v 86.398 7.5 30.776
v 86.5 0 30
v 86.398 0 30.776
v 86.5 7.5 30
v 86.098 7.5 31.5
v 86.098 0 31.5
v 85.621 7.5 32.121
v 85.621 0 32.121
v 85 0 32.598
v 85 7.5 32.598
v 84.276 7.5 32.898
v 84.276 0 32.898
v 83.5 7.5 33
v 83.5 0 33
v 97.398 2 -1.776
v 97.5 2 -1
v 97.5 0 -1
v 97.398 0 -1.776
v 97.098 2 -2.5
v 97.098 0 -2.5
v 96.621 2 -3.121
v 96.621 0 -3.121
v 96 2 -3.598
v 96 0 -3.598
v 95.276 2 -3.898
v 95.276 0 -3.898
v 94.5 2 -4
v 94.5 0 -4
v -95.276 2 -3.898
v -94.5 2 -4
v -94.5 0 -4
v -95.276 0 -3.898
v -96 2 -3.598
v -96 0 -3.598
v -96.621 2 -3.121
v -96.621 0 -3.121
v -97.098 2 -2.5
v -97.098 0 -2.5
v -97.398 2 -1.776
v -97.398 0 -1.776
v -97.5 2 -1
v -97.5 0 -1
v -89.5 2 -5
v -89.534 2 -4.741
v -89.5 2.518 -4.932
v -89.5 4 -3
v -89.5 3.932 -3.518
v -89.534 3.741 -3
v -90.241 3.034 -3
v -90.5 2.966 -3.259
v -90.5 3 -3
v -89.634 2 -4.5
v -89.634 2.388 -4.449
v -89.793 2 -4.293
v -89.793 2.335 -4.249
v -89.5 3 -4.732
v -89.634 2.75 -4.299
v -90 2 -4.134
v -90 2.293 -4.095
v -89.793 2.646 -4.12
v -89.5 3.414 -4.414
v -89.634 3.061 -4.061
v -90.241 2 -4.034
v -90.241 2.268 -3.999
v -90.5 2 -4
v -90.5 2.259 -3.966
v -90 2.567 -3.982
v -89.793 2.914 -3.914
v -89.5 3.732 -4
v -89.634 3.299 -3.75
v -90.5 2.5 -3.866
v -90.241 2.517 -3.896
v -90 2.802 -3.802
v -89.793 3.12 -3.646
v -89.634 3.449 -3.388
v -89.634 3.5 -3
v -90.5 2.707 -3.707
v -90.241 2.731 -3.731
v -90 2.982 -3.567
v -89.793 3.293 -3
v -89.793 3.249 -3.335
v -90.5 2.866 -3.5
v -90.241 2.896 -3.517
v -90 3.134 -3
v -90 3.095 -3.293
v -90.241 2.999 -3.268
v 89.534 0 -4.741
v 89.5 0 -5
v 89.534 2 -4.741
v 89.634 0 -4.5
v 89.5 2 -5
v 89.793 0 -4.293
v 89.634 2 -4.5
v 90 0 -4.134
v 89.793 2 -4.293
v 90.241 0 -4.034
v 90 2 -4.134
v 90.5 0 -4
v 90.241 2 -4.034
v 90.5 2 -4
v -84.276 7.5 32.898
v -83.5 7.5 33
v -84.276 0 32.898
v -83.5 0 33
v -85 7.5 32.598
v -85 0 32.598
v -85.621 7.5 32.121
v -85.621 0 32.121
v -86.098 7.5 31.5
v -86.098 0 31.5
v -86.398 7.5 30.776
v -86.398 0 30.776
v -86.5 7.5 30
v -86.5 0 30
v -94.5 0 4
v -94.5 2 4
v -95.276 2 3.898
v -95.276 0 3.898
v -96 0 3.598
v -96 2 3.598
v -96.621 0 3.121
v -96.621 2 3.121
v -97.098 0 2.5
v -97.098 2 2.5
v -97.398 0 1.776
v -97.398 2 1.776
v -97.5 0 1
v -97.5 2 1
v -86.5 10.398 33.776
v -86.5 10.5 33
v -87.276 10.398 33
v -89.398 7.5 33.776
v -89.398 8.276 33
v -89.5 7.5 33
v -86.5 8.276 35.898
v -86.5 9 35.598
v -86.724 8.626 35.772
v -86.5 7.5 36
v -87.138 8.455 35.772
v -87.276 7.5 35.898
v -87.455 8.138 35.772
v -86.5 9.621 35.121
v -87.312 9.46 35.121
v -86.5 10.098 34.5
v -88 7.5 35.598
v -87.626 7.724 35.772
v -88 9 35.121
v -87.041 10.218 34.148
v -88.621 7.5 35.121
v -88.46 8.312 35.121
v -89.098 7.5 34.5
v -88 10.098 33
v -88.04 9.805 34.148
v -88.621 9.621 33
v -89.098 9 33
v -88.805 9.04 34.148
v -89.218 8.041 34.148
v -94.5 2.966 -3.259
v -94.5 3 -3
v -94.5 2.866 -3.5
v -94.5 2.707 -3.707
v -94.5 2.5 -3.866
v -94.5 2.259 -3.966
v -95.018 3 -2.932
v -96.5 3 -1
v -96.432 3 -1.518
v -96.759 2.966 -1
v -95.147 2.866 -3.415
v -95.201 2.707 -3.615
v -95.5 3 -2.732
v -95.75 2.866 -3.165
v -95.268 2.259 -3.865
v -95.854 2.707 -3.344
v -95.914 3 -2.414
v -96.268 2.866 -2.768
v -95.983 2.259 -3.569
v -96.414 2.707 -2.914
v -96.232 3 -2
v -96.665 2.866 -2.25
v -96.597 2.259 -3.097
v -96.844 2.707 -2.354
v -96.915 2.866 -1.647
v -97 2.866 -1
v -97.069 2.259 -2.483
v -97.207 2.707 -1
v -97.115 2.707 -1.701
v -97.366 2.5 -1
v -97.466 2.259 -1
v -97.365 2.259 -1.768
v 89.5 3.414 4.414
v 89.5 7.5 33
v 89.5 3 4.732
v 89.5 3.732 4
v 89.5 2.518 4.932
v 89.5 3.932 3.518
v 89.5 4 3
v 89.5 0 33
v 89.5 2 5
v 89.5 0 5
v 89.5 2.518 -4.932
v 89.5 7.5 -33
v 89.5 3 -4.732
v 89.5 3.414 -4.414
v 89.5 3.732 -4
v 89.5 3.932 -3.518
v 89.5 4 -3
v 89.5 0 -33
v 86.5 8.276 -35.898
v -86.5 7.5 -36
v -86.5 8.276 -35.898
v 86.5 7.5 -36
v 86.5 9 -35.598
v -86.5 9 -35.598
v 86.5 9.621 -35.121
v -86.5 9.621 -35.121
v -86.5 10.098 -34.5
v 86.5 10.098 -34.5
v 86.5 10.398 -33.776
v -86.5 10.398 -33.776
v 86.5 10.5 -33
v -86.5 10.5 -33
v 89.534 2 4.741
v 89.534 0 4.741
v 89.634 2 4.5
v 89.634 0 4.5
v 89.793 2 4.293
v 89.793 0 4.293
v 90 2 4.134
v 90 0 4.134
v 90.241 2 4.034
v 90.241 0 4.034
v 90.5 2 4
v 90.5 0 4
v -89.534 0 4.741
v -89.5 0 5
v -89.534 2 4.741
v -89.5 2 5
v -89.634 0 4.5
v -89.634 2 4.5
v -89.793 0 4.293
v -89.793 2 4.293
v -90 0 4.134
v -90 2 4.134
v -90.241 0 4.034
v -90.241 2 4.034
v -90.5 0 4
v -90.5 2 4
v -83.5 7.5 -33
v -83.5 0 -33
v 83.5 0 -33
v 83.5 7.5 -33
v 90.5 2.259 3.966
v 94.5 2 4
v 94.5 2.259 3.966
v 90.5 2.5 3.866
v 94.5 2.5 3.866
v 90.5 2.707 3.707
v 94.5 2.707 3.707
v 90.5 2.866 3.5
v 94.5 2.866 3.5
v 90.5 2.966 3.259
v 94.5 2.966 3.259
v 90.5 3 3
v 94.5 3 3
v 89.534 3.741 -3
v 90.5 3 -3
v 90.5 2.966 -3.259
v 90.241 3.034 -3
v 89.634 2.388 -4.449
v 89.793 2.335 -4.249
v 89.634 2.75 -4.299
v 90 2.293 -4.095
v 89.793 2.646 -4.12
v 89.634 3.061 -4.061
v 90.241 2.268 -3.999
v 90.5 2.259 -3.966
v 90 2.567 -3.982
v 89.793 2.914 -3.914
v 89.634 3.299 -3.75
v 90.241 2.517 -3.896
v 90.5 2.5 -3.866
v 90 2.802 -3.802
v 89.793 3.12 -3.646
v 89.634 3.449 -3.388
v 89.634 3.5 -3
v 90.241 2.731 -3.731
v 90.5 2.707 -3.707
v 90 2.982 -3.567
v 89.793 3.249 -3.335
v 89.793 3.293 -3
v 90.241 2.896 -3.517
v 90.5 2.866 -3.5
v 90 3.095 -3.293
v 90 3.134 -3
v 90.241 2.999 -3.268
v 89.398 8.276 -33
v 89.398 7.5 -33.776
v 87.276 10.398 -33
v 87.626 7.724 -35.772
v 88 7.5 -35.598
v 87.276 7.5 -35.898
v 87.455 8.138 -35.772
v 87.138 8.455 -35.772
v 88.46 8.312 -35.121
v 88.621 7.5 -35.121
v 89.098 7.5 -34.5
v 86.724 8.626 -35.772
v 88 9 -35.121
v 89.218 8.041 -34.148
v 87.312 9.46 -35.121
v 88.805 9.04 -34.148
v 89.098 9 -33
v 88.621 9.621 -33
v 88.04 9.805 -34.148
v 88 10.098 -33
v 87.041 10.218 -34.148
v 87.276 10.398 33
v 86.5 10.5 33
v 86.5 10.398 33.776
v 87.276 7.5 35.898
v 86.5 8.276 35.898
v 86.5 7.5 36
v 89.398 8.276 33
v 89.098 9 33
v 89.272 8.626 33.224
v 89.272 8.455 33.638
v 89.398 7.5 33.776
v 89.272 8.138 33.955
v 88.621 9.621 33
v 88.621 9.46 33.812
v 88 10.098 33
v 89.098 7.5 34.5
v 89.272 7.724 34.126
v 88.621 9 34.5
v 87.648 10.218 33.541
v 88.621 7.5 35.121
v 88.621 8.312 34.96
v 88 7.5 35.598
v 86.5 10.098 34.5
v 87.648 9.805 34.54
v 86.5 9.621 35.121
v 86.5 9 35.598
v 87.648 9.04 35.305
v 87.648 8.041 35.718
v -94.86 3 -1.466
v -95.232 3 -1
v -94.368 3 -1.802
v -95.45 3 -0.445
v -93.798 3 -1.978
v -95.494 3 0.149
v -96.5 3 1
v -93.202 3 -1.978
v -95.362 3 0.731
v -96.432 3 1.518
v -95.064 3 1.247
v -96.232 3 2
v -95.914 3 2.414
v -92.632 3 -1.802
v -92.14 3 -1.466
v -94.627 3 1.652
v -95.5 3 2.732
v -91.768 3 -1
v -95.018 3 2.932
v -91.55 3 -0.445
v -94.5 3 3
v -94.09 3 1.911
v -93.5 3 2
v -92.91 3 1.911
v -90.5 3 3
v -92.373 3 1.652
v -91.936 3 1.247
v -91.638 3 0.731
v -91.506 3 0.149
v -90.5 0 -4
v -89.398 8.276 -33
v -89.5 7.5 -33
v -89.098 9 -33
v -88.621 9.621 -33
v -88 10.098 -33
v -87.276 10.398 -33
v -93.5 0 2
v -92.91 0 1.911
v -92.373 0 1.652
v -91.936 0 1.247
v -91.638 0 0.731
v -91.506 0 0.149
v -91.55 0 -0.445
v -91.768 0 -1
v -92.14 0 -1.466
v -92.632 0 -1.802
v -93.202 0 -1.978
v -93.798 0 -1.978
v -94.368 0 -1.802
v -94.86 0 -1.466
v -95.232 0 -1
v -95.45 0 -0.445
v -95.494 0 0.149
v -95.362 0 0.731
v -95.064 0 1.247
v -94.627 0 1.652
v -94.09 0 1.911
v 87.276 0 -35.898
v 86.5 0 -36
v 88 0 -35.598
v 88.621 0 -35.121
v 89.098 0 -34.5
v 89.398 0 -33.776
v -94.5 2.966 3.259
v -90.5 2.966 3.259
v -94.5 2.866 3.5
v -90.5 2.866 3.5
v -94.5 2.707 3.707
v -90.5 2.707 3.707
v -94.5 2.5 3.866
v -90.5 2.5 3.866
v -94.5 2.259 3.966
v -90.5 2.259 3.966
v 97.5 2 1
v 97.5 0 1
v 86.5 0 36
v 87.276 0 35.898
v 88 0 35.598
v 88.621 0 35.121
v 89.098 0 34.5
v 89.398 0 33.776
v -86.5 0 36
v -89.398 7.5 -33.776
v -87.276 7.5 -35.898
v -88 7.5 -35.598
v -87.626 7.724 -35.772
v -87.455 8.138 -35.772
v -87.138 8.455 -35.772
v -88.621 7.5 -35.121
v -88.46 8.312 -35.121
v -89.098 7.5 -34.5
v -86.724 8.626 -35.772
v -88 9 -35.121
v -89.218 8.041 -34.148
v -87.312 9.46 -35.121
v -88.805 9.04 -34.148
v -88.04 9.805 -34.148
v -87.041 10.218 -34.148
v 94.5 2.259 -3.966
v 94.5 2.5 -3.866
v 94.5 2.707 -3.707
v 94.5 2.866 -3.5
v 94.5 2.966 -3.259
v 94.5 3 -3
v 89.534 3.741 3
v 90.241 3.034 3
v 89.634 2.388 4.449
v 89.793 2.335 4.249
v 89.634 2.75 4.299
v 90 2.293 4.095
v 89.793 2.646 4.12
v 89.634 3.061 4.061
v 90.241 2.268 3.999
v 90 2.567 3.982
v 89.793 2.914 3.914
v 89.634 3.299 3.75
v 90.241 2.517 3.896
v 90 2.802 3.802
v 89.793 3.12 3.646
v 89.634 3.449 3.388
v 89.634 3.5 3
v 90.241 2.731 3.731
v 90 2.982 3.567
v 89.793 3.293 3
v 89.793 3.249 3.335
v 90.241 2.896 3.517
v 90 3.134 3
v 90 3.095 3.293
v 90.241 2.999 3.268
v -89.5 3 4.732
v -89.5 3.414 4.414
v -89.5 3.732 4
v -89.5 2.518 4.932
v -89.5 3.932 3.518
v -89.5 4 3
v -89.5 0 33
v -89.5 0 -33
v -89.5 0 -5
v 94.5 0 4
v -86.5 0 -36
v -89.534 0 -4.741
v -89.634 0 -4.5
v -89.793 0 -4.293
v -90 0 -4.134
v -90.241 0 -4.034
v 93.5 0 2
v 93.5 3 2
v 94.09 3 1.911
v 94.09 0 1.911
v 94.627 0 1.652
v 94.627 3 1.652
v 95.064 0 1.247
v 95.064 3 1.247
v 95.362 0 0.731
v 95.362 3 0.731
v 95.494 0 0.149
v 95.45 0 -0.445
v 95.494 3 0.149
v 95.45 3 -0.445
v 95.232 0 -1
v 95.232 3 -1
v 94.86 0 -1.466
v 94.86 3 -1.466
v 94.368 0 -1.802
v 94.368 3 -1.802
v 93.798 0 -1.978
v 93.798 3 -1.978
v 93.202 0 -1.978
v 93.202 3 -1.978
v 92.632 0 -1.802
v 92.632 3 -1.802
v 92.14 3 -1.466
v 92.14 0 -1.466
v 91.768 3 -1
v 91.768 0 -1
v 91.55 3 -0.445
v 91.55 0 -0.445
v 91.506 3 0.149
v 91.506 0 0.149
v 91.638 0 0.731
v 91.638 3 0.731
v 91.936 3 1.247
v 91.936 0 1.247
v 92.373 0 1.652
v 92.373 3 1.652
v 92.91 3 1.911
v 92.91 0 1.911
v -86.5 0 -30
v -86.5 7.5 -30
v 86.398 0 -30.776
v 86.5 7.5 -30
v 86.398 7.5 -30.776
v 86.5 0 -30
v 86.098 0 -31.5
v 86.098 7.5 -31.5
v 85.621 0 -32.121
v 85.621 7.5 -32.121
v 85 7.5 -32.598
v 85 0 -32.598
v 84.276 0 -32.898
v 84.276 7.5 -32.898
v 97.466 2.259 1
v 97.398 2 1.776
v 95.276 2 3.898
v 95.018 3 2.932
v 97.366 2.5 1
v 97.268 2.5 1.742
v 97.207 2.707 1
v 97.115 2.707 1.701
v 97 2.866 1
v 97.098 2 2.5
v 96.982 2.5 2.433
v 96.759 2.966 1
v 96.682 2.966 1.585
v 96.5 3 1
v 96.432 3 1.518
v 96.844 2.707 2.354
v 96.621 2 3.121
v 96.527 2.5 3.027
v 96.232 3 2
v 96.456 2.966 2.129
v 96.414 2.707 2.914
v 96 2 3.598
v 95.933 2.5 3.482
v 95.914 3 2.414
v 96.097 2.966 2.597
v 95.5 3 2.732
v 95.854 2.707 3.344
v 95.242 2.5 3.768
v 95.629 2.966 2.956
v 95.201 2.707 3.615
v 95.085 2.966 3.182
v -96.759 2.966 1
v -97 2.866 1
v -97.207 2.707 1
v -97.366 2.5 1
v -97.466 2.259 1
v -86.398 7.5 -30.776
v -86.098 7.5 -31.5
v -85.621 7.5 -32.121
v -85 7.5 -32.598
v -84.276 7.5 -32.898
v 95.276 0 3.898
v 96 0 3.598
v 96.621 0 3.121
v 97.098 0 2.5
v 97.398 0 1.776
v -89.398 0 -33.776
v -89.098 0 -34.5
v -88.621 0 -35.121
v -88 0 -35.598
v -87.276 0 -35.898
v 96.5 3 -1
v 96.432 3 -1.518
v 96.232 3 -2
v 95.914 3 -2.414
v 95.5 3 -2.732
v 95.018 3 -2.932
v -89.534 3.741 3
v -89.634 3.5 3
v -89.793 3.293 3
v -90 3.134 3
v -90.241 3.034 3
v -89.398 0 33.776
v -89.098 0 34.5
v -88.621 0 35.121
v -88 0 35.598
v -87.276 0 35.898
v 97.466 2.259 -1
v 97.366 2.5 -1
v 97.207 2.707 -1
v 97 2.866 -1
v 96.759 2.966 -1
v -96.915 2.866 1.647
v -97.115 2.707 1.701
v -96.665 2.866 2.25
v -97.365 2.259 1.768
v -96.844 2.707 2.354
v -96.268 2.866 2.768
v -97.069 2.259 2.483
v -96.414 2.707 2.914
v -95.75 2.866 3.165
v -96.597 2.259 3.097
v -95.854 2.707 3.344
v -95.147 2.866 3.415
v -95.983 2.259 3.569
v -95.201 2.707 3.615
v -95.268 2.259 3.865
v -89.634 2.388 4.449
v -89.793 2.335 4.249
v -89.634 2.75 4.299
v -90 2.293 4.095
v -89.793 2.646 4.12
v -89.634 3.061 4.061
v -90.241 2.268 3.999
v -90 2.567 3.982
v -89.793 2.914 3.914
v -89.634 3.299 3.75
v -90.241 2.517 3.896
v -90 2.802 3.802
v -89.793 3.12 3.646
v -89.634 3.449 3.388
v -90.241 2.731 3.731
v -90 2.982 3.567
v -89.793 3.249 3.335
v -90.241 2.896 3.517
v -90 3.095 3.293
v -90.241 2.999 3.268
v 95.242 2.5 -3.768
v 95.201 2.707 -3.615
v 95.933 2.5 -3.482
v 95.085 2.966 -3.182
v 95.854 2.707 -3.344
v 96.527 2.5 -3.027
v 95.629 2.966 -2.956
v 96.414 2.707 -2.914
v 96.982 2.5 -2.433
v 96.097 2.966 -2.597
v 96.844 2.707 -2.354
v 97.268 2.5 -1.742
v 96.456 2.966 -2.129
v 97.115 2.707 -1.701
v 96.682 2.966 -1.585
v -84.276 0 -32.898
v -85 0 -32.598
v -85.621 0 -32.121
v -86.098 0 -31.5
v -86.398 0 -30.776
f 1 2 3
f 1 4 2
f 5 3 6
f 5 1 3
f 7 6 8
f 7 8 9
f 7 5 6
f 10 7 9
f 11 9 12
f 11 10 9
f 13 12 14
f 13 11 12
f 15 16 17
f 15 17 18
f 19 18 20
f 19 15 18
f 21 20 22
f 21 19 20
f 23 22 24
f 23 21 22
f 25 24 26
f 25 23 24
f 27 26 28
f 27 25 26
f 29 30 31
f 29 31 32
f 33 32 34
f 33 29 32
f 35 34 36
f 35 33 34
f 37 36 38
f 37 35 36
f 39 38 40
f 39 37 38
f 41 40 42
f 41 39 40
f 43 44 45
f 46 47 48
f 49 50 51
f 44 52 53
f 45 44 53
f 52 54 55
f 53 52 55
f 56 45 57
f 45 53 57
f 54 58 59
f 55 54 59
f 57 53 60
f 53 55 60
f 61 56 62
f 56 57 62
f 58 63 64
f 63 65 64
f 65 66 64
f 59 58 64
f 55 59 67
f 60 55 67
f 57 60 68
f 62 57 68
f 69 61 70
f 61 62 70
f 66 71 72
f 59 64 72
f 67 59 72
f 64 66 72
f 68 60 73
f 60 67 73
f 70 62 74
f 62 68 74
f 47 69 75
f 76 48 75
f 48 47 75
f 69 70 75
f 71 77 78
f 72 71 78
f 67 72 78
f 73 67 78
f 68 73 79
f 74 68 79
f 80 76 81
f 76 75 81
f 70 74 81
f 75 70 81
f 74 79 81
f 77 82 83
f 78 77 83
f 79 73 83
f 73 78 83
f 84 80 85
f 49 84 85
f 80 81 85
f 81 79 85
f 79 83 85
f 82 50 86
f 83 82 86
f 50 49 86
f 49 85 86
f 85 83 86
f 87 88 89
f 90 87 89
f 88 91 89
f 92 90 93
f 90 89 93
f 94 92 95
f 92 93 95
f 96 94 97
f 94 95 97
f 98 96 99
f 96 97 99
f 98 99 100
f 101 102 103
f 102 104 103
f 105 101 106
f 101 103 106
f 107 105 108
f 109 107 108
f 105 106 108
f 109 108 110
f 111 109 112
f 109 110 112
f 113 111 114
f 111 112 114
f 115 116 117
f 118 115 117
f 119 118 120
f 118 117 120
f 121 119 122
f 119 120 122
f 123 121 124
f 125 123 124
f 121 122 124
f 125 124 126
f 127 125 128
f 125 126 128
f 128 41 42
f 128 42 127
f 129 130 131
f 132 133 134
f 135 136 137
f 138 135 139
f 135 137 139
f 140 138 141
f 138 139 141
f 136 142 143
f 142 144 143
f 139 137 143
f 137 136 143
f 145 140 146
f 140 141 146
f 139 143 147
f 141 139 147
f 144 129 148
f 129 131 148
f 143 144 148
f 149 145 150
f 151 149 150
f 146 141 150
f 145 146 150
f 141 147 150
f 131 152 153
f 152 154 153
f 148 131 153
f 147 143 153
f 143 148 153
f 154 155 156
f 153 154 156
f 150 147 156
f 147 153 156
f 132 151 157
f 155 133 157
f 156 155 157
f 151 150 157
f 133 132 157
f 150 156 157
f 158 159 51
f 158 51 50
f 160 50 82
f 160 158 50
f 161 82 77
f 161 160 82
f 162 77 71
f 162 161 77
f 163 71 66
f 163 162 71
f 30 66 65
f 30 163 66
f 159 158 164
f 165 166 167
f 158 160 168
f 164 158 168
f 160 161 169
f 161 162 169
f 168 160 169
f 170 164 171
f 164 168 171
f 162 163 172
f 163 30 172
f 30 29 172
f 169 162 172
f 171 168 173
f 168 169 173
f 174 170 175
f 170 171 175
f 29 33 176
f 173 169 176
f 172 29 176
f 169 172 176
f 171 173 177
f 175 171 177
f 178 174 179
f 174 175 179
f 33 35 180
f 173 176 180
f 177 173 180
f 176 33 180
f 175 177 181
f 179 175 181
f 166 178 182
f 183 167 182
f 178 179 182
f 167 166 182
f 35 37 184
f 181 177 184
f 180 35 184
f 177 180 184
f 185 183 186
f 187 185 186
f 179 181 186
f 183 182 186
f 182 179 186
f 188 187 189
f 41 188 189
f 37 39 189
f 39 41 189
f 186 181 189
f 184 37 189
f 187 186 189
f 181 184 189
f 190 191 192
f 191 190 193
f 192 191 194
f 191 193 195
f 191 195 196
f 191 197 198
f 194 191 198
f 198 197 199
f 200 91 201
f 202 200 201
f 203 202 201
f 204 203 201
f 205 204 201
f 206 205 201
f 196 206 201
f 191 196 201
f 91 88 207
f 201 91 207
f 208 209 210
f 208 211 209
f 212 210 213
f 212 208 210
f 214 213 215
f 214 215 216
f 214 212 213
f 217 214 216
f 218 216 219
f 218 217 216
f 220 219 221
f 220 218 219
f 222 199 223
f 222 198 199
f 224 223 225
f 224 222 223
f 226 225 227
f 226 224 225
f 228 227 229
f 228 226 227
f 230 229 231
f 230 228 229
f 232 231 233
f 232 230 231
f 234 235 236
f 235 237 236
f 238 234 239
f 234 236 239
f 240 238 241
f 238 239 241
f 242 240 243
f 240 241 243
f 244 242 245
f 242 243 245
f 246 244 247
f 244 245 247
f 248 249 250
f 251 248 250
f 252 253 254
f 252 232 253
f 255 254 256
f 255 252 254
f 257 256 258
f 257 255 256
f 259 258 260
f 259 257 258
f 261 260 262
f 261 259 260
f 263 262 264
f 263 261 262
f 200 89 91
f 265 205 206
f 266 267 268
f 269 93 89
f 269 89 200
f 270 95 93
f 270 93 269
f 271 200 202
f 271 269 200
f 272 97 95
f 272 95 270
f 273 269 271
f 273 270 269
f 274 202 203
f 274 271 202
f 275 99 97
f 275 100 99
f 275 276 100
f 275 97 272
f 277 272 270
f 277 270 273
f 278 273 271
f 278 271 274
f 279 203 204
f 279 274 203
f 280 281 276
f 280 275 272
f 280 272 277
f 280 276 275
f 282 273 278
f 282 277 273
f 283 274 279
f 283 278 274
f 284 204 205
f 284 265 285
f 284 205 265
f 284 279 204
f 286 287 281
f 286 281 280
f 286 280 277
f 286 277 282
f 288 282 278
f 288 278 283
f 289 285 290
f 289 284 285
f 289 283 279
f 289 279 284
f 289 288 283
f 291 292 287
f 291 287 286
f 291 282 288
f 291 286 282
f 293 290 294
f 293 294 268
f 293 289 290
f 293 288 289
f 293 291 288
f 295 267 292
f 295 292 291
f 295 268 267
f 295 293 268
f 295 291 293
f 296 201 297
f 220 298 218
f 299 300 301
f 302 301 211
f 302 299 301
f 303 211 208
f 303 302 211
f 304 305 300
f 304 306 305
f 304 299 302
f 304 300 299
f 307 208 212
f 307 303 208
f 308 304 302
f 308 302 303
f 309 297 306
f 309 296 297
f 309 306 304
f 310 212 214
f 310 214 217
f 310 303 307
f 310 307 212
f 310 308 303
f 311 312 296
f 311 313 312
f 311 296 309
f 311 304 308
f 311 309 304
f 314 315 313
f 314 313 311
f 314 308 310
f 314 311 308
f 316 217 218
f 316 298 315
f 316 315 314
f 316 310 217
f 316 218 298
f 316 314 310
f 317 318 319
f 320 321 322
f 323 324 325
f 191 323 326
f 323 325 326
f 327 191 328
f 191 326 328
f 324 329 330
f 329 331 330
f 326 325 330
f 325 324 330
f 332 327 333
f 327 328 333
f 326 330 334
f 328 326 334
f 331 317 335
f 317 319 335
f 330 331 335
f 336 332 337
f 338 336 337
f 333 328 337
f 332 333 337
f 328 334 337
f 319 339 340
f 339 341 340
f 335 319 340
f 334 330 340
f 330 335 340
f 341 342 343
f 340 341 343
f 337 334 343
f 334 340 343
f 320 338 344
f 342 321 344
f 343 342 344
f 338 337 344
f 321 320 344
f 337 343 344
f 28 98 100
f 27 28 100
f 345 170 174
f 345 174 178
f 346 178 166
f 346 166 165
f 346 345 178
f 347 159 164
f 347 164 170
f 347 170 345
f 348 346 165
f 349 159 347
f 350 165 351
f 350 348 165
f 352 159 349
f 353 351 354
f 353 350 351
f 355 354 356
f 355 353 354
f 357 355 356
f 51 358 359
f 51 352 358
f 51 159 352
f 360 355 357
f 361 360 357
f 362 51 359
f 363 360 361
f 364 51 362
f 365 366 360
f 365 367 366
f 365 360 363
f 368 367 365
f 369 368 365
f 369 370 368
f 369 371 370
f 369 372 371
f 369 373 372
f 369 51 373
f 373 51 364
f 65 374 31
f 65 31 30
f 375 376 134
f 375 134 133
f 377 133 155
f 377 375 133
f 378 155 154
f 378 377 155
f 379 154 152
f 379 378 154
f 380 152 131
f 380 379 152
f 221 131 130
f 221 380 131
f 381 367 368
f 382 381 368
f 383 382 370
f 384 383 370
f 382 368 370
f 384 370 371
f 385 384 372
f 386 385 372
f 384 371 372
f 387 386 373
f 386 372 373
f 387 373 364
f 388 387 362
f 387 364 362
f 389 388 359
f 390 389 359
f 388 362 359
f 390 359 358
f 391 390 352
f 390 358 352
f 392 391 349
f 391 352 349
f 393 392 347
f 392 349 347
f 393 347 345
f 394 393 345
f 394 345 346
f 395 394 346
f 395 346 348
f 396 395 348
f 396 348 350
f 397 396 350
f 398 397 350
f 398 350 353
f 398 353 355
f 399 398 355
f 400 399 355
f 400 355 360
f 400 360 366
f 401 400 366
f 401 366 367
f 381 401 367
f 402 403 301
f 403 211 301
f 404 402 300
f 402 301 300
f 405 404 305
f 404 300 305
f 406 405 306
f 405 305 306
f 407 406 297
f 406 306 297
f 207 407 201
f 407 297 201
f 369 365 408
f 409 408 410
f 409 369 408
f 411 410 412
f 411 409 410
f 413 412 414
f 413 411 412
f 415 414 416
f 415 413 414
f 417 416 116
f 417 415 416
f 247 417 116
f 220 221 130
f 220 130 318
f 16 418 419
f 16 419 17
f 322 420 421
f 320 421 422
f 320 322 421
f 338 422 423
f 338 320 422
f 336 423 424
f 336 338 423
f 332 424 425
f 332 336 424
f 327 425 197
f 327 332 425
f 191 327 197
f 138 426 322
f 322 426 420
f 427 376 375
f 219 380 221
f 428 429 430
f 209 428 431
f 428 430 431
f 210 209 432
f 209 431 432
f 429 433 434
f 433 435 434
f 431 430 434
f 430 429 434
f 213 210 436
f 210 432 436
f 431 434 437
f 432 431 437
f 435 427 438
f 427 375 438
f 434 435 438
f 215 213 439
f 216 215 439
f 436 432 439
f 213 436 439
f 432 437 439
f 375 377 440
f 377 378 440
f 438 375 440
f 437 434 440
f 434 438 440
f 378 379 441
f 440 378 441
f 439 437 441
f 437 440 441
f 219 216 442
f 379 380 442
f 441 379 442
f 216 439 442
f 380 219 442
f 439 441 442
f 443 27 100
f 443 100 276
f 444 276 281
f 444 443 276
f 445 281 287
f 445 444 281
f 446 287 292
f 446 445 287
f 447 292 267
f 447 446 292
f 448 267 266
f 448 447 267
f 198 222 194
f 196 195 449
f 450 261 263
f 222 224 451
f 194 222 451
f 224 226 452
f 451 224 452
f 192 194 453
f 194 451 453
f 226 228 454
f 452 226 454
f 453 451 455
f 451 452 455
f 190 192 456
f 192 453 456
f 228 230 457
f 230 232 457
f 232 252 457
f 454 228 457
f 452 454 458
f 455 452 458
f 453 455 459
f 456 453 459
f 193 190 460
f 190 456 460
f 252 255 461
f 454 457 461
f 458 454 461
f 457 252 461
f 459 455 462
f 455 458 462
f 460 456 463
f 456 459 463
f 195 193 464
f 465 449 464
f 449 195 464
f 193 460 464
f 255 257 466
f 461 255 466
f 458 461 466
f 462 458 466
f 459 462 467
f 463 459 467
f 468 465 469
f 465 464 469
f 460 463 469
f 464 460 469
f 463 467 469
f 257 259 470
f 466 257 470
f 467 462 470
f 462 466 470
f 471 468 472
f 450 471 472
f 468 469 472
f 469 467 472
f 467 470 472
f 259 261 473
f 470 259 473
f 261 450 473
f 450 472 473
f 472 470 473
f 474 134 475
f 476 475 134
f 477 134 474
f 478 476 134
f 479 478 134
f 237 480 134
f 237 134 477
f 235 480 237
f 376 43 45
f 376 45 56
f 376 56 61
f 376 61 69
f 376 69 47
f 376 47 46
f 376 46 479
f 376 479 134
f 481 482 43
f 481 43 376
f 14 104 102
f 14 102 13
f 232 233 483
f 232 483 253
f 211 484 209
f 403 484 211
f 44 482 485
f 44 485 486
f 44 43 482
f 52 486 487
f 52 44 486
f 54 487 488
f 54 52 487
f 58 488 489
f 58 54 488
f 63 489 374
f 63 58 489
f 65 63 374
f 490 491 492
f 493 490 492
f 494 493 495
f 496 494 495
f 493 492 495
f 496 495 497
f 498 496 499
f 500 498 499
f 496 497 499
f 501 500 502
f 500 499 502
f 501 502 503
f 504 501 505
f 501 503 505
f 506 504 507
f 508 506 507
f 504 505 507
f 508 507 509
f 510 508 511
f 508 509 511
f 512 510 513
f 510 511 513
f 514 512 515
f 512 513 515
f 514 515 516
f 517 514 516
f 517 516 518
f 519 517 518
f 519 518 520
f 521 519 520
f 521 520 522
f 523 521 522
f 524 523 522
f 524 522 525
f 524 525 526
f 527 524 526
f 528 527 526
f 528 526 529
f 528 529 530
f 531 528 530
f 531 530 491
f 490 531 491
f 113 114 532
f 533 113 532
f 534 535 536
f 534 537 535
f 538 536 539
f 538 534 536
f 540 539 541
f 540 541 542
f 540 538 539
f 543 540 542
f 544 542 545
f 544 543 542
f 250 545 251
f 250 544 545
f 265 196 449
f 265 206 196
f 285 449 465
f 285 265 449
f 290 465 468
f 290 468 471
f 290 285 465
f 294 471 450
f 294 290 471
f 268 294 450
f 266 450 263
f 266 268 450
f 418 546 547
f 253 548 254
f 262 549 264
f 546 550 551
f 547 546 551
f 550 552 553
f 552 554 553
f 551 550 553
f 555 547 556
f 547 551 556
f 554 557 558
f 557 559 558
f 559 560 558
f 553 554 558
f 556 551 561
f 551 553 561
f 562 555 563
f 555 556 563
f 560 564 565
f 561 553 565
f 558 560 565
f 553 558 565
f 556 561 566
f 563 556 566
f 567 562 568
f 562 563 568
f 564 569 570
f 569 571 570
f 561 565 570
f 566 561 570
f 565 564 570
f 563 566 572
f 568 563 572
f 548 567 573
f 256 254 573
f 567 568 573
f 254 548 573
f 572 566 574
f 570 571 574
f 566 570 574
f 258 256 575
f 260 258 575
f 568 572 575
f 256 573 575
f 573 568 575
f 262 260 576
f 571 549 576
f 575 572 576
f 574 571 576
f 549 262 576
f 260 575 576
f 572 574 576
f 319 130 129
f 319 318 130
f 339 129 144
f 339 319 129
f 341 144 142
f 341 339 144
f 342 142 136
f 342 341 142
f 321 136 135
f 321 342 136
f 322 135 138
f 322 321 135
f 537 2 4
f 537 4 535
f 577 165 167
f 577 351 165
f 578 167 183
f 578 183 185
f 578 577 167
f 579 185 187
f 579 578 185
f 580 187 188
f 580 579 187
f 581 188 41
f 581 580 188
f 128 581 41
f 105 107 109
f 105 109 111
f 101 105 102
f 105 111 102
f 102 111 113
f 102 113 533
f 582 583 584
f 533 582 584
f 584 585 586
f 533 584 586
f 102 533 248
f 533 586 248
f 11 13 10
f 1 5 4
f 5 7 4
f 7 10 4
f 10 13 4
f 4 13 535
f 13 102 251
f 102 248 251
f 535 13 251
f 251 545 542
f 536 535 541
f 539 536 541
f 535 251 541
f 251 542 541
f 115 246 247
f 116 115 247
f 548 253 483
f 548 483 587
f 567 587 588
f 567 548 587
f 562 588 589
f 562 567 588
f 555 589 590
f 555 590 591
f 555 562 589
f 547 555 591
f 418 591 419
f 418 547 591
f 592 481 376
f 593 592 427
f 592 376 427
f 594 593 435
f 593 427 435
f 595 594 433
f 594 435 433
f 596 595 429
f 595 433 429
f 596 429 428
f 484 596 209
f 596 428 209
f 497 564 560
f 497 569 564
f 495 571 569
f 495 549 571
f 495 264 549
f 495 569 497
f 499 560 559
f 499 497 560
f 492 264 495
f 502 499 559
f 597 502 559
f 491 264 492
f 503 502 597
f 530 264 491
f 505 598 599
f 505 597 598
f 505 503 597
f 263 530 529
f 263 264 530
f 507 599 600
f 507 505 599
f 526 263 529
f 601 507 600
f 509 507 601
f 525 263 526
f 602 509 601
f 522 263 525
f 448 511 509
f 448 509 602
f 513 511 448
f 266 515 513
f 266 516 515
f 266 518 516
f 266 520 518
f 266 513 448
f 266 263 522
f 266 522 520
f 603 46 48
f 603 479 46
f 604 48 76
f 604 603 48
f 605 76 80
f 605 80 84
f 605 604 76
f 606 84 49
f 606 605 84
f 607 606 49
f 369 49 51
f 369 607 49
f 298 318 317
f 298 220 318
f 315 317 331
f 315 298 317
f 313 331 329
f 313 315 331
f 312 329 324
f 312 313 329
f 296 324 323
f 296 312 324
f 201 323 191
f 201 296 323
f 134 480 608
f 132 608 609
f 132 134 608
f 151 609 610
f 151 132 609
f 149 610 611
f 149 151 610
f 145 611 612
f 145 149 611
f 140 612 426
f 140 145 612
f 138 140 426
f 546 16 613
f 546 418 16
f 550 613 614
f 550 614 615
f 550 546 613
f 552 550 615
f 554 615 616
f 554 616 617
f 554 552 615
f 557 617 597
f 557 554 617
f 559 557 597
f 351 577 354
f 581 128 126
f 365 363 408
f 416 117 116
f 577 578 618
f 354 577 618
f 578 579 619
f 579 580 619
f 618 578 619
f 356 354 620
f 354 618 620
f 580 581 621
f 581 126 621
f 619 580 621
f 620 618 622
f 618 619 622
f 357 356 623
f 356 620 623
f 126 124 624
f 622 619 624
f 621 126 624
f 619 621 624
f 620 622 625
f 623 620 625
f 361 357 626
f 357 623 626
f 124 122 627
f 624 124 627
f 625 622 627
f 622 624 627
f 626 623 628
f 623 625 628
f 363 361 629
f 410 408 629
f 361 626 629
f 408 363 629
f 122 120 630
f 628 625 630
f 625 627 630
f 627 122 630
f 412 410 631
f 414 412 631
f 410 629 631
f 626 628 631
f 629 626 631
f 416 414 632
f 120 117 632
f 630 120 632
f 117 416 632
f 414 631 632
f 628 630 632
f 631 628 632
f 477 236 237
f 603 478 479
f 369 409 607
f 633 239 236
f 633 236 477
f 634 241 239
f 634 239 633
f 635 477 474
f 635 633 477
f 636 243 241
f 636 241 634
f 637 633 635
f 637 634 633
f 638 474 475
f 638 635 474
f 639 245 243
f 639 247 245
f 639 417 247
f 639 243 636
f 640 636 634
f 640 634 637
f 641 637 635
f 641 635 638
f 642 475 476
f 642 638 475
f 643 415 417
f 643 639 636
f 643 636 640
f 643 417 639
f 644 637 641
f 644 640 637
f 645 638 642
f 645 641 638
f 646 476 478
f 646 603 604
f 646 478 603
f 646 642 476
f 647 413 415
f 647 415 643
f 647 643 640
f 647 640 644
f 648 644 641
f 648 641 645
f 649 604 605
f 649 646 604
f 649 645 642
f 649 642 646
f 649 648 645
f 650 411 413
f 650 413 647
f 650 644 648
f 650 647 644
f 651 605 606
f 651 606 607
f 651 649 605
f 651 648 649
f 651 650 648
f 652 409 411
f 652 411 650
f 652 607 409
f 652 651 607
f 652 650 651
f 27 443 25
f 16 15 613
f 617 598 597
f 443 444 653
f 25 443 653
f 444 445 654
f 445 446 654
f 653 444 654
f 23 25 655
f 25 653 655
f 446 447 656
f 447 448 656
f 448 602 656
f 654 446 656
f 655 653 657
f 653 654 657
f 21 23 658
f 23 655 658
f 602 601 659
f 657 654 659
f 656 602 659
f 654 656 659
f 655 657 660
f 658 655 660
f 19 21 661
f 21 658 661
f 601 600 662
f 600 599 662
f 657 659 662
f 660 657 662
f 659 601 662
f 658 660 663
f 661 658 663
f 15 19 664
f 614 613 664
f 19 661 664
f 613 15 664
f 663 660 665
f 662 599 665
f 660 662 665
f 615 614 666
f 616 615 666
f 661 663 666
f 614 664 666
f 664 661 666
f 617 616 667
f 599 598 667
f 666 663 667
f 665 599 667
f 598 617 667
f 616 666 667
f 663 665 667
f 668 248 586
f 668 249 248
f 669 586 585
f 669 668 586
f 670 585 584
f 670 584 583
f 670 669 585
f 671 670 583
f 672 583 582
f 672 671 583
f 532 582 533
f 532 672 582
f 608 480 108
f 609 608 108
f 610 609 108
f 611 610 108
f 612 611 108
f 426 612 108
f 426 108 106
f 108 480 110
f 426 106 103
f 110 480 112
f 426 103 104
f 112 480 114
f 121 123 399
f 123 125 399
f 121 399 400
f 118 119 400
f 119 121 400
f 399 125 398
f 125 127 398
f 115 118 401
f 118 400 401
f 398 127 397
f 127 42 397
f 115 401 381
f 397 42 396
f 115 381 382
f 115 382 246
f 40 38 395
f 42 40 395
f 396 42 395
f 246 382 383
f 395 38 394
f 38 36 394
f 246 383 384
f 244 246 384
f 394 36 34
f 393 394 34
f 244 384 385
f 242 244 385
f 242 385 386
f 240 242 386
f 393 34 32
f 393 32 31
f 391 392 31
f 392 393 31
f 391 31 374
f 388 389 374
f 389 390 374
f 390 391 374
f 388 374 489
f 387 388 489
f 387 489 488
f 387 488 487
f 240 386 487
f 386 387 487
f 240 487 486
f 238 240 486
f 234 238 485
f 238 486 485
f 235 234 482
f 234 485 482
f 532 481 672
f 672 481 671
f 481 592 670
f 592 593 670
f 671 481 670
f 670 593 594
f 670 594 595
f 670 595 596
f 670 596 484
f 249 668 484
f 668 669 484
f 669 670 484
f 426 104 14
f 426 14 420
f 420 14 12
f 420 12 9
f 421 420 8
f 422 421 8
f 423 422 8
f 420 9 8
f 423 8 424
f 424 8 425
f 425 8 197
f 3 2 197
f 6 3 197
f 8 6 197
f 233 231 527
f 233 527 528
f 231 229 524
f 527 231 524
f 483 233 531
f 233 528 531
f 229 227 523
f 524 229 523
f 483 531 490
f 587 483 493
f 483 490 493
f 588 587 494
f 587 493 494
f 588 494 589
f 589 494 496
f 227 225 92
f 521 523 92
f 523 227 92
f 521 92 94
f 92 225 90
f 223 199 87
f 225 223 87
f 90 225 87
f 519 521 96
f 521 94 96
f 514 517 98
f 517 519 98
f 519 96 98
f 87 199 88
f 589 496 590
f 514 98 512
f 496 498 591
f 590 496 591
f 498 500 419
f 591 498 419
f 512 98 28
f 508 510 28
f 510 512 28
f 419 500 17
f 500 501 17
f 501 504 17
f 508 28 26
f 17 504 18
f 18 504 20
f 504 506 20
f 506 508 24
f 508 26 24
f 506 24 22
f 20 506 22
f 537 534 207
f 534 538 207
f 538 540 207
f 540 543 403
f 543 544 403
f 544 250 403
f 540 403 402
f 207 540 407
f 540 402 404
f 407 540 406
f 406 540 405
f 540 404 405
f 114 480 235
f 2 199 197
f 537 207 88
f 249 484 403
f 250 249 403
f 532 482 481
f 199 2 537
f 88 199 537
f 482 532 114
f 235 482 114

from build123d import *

# Parameters (mm, degrees)
SKETCH1_W           = 179
SKETCH1_H           = 72
BOSS_EXTRUDE1_DEPTH = 10.5
SHELL1_T            = -3
SKETCH2_W           = 8
SKETCH2_H           = 3
BOSS_EXTRUDE2_DEPTH = 8
SKETCH3_W           = 8
SKETCH3_H           = 3
BOSS_EXTRUDE3_DEPTH = 8
SKETCH4_R           = 2
CUT_EXTRUDE1_DEPTH  = 8
SKETCH5_R           = 2
CUT_EXTRUDE2_DEPTH  = 8
FILLET1_R           = 3
FILLET2_R           = 1


with BuildPart() as part:
    # Sketch1 → Boss-Extrude1 (new body)
    with BuildSketch(Plane(origin=(0, 0, 0), x_dir=(1, 0, 0), z_dir=(0, 1, 0))):
        Rectangle(SKETCH1_W, SKETCH1_H)
    extrude(amount=BOSS_EXTRUDE1_DEPTH)

    # Shell1
    shell1_openings = [part.faces().sort_by_distance(p)[0] for p in [
        (0, 0, 0),
    ]]
    offset(amount=SHELL1_T, openings=shell1_openings, kind=Kind.INTERSECTION)

    # Sketch2 → Boss-Extrude2 (add)
    with BuildSketch(Plane.ZY.offset(89.5)):
        with Locations((0, 1.5)):
            Rectangle(SKETCH2_W, SKETCH2_H)
    extrude(amount=BOSS_EXTRUDE2_DEPTH)

    # Sketch3 → Boss-Extrude3 (add)
    with BuildSketch(Plane(origin=(89.5, 0, 0), x_dir=(0, 0, -1), z_dir=(1, 0, 0))):
        with Locations((0, 1.5)):
            Rectangle(SKETCH3_W, SKETCH3_H)
    extrude(amount=BOSS_EXTRUDE3_DEPTH)

    # Sketch4 → Cut-Extrude1 (cut)
    with BuildSketch(Plane(origin=(0, 3, 0), x_dir=(1, 0, 0), z_dir=(0, 1, 0))):
        with Locations(Location((-93.5, 0, 0), (0, 0, 270))):
            Circle(SKETCH4_R)
    extrude(amount=-CUT_EXTRUDE1_DEPTH, mode=Mode.SUBTRACT)

    # Sketch5 → Cut-Extrude2 (cut)
    with BuildSketch(Plane(origin=(0, 3, 0), x_dir=(1, 0, 0), z_dir=(0, 1, 0))):
        with Locations(Location((93.5, 0, 0), (0, 0, 270))):
            Circle(SKETCH5_R)
    extrude(amount=-CUT_EXTRUDE2_DEPTH, mode=Mode.SUBTRACT)

    # Fillet1
    fillet1_edges = [part.edges().sort_by_distance(p)[0] for p in [
        (-89.5, 10.5, 0),
        (86.5, 3.75, 33),
        (86.5, 3.75, -33),
        (-86.5, 3.75, -33),
        (-86.5, 3.75, 33),
        (0, 10.5, 36),
        (-97.5, 1.5, -4),
        (-97.5, 1.5, 4),
        (97.5, 1.5, 4),
        (97.5, 1.5, -4),
        (89.5, 10.5, 0),
        (89.5, 5.25, 36),
        (-89.5, 5.25, 36),
        (-89.5, 5.25, -36),
        (89.5, 5.25, -36),
        (0, 10.5, -36),
    ]]
    fillet(fillet1_edges, radius=FILLET1_R)

    # Fillet2
    fillet2_edges = [part.edges().sort_by_distance(p)[0] for p in [
        (92, 3, -4),
        (96.621320344, 3, -3.121320344),
        (96.621320344, 3, 3.121320344),
        (-97.5, 3, 0),
        (-92, 3, -4),
        (-92, 3, 4),
        (-96.621320344, 3, 3.121320344),
        (-96.621320344, 3, -3.121320344),
        (-89.5, 1.5, -4),
        (-89.5, 1.5, 4),
        (-89.5, 3, 0),
        (89.5, 1.5, 4),
        (89.5, 1.5, -4),
        (89.5, 3, 0),
        (97.5, 3, 0),
        (92, 3, 4),
    ]]
    fillet(fillet2_edges, radius=FILLET2_R)


solid = part.part
